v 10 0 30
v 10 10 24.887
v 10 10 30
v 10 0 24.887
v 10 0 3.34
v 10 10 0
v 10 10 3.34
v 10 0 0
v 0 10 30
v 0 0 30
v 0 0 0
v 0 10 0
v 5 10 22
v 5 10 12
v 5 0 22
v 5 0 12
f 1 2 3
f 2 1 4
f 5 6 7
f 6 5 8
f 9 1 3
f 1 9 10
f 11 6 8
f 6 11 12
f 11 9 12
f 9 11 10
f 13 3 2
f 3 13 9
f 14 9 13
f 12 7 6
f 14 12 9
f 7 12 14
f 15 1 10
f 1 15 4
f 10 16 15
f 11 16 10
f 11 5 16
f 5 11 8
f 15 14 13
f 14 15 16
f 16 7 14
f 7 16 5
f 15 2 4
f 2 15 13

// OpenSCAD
bottom_slope = 60;
top_slope = 30;

difference() {
	cube([10, 10, 30]);
	translate([5, 0, 12])
		cube([5, 10, 10]);
	translate([5, 0, 12])
		rotate([0, bottom_slope, 0])
			cube([20, 10, 10]);
	translate([5, 0, 22])
		rotate([0, -top_slope, 0])
			translate([0, 0, -10])
				cube([20, 10, 10]);
}
